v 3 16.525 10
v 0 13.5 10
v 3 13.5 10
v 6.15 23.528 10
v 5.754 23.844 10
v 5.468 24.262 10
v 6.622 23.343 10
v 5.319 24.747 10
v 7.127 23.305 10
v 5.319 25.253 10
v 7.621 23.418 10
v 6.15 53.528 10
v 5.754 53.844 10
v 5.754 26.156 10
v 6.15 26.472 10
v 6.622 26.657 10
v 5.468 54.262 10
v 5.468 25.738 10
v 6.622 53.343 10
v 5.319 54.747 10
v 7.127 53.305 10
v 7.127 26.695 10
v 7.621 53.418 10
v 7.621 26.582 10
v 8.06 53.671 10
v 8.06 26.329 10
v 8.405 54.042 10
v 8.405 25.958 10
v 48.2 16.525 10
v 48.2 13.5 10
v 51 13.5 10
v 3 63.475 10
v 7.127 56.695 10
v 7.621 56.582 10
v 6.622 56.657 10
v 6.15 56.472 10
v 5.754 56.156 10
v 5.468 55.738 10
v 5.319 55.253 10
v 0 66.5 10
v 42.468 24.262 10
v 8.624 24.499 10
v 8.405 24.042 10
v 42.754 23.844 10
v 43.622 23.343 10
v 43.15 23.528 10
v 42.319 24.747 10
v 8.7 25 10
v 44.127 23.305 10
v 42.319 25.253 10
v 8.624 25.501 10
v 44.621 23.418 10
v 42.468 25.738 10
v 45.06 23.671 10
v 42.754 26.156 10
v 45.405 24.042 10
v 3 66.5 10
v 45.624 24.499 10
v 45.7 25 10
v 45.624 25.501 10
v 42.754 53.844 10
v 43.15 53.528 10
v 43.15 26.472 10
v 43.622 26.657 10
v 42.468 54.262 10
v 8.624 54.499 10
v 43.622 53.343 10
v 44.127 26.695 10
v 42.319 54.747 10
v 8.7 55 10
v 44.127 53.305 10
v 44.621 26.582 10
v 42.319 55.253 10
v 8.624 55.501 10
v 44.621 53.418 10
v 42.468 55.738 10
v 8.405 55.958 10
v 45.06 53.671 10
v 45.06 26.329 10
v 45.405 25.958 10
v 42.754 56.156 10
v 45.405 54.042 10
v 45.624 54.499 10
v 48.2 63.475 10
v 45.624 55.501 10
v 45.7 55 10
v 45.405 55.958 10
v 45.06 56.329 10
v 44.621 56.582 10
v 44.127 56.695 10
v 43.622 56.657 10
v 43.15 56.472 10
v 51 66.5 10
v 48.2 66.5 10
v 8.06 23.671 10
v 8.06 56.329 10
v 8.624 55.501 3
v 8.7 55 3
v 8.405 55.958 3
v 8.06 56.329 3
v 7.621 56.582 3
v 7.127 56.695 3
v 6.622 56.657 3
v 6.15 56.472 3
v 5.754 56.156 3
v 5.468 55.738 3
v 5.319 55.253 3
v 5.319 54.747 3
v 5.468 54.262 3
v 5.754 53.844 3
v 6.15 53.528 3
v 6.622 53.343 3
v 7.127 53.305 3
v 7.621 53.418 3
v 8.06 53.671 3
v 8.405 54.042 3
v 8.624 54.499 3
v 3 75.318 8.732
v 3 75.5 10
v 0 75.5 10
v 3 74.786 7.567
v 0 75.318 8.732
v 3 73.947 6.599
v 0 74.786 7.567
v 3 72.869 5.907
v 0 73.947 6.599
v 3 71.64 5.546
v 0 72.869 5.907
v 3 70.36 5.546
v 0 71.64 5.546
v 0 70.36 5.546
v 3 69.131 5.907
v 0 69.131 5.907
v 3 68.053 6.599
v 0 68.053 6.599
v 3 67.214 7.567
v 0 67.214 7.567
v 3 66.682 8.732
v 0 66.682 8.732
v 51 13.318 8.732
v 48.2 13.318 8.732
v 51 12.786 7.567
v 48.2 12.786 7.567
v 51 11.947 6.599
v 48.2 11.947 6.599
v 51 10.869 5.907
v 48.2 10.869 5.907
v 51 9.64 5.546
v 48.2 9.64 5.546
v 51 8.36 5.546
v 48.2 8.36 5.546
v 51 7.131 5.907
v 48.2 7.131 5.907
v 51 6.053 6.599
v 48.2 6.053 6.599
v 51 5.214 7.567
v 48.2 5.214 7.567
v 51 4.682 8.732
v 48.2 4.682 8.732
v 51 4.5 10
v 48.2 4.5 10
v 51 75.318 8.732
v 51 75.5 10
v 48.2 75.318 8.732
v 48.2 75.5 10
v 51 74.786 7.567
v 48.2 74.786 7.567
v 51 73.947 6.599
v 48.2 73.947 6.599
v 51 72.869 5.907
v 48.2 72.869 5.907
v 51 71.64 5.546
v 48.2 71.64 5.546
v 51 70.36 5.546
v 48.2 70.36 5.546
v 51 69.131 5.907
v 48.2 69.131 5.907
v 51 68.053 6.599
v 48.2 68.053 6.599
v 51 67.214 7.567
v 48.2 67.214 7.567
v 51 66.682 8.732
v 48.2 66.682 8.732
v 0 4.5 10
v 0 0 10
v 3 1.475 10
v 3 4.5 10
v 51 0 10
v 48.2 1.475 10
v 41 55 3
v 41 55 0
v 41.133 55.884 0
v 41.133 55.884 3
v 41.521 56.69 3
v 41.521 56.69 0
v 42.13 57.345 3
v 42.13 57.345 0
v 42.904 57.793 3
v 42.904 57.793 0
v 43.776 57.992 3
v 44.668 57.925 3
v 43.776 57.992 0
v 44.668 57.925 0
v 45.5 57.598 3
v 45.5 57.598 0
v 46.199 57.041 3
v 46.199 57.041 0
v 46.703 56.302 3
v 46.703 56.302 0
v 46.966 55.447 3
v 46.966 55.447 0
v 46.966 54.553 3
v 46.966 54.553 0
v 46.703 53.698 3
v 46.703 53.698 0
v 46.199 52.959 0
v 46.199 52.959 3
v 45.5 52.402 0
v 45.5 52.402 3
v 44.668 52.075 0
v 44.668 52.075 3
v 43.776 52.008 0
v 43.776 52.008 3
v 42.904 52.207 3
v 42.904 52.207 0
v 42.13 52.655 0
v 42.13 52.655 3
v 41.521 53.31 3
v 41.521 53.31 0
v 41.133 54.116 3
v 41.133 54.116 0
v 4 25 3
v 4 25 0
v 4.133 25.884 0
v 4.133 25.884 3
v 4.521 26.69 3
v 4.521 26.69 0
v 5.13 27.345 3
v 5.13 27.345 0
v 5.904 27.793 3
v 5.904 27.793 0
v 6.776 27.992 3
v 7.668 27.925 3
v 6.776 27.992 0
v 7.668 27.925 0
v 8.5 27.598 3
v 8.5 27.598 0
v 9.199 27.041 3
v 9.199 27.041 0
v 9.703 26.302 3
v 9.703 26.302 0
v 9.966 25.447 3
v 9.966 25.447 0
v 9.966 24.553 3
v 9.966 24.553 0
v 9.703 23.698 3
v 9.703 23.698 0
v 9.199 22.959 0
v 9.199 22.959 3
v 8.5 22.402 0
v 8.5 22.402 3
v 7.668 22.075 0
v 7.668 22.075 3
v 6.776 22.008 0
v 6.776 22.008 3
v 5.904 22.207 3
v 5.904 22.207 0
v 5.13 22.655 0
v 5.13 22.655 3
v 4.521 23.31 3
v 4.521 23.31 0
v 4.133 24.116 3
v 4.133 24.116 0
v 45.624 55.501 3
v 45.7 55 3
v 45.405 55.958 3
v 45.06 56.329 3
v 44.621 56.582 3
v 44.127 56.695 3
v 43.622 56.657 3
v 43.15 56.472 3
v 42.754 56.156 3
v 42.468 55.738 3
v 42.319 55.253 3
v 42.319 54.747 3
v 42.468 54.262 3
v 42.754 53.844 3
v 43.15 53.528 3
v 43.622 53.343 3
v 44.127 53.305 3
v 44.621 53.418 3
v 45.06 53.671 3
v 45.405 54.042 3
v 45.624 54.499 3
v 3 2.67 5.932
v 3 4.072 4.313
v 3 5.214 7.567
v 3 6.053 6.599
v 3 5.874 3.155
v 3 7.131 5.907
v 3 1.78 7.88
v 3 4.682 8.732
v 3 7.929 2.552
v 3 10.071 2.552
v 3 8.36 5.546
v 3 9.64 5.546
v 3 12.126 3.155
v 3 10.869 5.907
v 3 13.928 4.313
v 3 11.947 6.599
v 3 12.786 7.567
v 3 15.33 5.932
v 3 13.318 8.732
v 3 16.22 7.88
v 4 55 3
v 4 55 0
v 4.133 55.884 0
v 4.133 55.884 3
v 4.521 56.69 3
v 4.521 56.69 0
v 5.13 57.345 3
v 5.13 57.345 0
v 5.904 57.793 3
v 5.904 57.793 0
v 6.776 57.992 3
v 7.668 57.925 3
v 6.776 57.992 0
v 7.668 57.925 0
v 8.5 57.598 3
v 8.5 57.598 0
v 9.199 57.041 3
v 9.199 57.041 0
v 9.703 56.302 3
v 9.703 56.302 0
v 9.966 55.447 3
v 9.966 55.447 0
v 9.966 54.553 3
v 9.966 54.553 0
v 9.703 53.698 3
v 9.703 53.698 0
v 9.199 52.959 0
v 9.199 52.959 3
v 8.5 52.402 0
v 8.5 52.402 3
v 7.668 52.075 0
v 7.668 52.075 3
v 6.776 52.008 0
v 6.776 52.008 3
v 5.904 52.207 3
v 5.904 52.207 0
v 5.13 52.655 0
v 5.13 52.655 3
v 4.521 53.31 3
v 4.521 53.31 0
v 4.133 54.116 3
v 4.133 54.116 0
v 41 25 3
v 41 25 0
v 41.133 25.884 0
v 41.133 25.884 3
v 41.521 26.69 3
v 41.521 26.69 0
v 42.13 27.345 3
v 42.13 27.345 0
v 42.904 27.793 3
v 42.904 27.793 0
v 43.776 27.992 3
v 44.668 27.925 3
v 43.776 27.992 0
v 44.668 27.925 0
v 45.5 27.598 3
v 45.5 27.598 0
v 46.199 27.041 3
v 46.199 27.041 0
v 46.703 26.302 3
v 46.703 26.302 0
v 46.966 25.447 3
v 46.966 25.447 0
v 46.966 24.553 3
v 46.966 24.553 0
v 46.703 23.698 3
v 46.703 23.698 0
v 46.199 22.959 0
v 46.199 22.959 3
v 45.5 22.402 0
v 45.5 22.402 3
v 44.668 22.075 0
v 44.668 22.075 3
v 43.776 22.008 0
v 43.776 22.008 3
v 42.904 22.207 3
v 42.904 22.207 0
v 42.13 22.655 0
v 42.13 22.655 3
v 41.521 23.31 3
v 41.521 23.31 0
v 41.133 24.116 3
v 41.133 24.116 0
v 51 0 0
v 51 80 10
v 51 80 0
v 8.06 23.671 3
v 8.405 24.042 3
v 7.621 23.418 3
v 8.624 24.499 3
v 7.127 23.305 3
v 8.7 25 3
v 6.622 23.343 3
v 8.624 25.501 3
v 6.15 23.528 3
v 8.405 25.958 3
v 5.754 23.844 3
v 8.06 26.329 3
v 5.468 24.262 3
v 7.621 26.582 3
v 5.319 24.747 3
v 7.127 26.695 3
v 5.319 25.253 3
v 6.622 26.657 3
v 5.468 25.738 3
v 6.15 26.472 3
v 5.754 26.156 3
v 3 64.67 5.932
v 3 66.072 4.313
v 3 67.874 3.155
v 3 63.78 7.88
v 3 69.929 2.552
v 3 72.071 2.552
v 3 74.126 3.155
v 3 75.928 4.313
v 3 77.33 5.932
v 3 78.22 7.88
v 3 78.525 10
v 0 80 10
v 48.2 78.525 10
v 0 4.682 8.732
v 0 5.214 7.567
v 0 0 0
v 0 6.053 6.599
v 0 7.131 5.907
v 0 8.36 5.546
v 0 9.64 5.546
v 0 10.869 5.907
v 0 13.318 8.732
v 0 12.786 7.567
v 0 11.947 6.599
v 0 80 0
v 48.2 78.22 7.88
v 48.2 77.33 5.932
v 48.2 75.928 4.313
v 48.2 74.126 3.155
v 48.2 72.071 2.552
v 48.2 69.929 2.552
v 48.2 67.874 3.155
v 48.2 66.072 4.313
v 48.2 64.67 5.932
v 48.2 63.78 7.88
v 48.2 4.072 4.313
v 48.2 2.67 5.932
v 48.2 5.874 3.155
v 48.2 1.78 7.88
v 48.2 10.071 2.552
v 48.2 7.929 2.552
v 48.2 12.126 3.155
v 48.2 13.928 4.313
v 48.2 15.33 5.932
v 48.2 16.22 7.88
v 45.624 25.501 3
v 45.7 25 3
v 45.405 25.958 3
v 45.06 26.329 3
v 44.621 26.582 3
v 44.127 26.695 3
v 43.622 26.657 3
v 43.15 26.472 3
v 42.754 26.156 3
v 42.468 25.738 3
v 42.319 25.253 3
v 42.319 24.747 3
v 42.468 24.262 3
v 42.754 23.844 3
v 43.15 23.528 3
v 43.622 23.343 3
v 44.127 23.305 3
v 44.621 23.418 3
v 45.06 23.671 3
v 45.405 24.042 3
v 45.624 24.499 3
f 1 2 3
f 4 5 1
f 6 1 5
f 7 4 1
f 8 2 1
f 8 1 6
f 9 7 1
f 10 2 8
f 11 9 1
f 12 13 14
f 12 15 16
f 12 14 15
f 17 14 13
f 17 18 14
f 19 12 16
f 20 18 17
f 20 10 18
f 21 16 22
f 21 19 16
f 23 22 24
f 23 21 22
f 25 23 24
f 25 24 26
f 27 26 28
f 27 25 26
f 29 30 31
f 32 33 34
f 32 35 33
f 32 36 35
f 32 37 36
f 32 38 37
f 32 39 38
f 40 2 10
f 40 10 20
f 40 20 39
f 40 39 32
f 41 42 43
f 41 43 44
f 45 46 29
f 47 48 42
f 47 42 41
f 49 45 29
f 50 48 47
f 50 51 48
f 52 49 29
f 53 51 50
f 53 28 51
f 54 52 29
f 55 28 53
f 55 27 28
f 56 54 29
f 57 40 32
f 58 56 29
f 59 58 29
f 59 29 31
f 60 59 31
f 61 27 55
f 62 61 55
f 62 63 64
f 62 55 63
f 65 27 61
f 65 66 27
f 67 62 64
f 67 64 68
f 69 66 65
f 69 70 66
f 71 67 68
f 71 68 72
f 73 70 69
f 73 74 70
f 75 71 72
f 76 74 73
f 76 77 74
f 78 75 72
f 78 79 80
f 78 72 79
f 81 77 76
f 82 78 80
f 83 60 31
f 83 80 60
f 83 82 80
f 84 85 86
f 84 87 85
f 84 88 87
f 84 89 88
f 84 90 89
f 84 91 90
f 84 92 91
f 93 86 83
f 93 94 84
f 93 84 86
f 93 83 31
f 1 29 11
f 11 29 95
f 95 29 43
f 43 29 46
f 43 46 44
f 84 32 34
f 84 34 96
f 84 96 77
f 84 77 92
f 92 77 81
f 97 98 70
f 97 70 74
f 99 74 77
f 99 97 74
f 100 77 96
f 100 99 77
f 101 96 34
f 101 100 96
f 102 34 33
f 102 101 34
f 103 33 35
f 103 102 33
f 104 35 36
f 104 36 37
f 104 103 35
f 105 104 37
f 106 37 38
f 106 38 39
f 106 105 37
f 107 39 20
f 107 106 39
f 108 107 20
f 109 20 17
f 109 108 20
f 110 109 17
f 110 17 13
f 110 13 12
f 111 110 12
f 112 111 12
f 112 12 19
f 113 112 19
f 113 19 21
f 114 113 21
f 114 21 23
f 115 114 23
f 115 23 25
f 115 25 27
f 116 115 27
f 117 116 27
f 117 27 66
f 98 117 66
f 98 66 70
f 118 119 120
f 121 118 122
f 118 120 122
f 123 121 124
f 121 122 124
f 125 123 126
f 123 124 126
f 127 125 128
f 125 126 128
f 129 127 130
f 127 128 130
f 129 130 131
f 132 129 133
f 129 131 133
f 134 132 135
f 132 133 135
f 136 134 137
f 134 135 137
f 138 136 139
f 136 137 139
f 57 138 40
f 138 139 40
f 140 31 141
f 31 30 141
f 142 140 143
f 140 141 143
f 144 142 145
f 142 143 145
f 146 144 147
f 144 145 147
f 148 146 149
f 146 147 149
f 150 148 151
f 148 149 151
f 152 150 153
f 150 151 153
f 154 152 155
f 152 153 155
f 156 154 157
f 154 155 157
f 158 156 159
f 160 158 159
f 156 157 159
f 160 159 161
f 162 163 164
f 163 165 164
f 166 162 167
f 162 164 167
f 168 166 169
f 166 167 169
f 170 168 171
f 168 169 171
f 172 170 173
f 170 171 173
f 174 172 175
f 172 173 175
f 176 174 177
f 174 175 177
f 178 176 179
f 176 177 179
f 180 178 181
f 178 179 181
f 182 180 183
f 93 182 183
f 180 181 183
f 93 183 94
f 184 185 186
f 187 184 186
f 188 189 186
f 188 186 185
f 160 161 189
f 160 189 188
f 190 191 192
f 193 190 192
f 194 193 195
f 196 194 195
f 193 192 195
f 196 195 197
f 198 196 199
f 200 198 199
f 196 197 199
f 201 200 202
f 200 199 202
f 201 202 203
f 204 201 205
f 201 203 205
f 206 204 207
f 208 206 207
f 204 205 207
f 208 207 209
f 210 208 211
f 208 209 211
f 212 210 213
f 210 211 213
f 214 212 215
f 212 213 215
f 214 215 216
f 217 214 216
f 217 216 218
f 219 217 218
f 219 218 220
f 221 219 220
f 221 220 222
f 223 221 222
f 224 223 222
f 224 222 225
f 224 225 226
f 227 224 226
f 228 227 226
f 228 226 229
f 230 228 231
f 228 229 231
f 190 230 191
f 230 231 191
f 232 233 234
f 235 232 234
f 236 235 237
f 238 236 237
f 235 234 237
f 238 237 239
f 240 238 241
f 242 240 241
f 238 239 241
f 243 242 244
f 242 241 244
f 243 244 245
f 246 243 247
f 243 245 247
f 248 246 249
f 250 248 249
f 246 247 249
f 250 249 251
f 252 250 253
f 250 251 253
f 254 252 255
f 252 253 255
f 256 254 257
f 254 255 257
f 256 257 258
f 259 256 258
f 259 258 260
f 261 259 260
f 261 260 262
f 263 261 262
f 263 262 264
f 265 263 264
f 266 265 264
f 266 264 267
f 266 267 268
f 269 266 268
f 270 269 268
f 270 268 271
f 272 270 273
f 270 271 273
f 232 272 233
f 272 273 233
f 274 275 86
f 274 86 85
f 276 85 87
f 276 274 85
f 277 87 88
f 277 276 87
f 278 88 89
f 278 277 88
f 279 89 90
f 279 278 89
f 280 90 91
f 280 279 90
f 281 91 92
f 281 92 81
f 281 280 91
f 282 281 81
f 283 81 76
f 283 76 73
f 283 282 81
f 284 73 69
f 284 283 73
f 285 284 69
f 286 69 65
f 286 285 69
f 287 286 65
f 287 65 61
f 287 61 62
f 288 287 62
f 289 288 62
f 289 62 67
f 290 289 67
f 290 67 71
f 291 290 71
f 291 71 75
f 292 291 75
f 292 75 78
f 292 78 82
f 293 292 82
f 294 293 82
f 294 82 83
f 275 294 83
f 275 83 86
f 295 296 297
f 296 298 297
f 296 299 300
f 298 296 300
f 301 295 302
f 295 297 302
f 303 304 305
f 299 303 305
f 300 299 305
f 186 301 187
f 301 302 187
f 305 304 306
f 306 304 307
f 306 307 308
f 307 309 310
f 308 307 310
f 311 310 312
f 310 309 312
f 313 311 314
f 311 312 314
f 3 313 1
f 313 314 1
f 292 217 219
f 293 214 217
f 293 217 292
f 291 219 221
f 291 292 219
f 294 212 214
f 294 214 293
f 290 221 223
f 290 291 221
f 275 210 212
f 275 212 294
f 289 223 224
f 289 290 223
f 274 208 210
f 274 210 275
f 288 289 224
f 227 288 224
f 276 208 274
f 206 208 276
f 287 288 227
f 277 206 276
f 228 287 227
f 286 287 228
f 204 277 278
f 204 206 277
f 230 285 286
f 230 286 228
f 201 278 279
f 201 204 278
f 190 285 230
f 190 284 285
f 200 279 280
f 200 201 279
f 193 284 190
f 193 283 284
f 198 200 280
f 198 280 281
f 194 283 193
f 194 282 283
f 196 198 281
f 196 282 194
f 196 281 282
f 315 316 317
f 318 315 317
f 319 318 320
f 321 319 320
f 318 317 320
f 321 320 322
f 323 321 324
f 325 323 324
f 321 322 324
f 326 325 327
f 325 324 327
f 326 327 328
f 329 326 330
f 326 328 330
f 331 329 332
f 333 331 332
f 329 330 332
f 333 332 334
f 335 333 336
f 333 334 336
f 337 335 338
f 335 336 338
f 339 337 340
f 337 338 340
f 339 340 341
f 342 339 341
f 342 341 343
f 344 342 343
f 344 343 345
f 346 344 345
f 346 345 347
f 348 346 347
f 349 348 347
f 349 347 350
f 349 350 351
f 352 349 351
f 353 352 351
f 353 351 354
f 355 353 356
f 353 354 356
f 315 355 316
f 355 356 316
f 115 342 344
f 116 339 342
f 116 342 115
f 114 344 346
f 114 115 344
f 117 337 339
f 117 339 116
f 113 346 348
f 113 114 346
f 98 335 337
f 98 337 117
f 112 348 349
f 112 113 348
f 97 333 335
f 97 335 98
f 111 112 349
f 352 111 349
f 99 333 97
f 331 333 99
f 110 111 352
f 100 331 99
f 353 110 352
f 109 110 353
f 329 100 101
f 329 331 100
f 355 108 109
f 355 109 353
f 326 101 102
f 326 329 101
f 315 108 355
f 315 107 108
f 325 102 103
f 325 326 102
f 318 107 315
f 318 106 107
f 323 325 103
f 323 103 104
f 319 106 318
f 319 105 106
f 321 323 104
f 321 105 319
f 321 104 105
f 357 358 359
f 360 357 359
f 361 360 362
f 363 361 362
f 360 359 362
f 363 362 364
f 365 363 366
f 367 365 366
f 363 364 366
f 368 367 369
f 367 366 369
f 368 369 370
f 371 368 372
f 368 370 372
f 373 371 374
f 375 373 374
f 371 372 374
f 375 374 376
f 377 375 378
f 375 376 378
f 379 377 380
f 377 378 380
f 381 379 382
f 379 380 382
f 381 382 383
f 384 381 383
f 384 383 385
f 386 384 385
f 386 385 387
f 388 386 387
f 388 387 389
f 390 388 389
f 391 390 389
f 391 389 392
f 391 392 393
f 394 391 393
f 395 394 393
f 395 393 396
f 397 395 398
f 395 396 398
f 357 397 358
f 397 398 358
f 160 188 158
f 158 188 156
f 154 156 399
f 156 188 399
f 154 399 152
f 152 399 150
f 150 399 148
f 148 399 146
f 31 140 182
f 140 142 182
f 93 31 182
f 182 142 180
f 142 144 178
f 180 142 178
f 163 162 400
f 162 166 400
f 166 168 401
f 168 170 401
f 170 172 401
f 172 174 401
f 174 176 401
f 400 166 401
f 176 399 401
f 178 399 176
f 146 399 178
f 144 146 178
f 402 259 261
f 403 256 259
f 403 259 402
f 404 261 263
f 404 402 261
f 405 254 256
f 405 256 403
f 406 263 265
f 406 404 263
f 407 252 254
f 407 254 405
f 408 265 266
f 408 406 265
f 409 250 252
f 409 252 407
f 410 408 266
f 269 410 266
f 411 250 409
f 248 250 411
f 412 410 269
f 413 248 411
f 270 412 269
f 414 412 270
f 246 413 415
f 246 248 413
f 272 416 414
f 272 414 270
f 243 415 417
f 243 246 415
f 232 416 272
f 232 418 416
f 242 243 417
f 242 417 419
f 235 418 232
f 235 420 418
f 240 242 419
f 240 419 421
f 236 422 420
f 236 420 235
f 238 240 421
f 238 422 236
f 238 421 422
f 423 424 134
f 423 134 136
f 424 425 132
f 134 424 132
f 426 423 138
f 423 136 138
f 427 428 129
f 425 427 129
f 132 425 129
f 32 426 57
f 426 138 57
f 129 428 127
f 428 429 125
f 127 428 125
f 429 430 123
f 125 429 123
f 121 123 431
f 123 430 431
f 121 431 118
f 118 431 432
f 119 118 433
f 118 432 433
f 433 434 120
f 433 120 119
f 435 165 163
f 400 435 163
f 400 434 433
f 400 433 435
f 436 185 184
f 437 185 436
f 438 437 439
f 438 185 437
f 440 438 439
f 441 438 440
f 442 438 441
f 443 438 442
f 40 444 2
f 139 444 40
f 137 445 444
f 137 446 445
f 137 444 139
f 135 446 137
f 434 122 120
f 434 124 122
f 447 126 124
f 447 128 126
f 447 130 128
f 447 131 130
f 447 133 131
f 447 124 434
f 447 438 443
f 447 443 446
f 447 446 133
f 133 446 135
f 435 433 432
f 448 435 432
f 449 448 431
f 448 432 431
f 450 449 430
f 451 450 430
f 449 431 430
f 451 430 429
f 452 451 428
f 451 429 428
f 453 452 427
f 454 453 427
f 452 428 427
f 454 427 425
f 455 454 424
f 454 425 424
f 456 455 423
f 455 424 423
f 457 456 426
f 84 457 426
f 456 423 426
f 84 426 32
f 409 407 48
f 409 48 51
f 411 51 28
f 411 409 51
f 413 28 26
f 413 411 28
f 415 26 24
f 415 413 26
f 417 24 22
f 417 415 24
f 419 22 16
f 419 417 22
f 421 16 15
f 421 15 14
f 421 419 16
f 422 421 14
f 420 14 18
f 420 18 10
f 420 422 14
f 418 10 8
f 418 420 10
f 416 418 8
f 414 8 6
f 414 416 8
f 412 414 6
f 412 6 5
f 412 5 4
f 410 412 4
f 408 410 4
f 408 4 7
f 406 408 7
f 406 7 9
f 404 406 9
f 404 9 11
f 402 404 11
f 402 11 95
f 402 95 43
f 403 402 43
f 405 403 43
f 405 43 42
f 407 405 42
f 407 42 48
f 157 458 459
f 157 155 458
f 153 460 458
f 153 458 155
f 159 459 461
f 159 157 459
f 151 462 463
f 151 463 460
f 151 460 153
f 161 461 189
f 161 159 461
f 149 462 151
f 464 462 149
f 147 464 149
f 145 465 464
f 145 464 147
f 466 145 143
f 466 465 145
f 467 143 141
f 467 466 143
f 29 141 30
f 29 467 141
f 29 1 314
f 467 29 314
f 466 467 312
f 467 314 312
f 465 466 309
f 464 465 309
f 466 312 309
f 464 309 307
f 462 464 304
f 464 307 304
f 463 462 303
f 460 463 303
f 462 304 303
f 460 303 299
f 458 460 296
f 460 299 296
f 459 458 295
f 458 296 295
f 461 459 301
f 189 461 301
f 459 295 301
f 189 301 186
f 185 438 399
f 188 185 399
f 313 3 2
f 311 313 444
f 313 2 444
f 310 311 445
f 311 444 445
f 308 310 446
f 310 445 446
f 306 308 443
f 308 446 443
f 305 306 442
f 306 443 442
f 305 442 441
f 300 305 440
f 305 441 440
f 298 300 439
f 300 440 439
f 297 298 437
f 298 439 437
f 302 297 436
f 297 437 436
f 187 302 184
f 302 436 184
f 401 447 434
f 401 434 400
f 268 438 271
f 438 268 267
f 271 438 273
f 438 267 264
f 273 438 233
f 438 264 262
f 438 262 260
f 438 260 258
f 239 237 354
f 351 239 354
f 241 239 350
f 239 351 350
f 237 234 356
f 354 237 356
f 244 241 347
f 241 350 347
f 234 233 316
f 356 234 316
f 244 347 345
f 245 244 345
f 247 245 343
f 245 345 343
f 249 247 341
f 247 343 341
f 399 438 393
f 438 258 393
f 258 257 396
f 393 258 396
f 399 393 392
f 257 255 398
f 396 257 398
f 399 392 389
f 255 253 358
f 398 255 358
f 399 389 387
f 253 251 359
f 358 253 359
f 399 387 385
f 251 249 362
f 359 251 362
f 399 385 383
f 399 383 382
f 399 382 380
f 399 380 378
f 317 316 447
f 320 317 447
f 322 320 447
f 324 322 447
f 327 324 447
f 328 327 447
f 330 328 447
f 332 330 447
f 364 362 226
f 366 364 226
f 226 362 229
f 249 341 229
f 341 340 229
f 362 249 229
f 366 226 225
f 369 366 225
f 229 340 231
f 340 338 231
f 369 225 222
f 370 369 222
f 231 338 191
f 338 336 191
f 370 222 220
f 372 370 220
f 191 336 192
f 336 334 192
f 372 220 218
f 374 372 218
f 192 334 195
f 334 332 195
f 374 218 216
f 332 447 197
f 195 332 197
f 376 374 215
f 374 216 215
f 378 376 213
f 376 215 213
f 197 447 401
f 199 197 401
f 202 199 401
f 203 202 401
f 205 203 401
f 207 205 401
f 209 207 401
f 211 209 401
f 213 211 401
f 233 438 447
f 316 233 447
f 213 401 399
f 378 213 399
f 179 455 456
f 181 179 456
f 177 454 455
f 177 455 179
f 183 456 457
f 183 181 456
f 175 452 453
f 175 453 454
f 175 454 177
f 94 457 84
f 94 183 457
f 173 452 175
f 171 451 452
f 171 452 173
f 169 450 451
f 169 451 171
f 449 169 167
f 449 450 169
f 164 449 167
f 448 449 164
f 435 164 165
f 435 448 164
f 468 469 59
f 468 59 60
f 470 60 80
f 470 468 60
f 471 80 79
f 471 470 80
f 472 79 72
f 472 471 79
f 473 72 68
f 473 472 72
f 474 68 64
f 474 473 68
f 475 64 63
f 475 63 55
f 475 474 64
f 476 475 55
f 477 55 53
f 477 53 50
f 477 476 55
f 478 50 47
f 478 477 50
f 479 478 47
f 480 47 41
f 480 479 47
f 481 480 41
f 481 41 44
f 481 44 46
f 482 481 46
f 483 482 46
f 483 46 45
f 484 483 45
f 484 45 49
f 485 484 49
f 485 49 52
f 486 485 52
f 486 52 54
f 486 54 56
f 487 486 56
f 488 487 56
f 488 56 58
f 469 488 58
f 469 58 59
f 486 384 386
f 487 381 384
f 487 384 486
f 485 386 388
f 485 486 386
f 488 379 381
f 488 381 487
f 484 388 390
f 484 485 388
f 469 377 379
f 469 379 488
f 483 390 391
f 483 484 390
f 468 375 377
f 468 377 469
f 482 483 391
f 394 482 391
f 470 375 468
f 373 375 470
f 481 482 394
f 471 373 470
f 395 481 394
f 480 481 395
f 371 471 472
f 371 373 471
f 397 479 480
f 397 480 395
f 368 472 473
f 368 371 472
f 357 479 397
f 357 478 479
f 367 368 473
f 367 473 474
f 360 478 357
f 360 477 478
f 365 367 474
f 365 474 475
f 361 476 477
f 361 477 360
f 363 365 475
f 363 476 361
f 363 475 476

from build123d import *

# Parameters (mm, degrees)
SKETCH1_W           = 51
SKETCH1_H           = 80
SKETCH1_R           = 1.7
BOSS_EXTRUDE1_DEPTH = 10
SKETCH2_R           = 7.525
CUT_EXTRUDE1_DEPTH  = 45.2
SKETCH3_R           = 4.5
CUT_EXTRUDE2_DEPTH  = 96.399161422
SKETCH4_R           = 3
CUT_EXTRUDE3_DEPTH  = 3


with BuildPart() as part:
    # Sketch1 → Boss-Extrude1 (new body)
    with BuildSketch(Plane.XY):
        with Locations((25.5, 40)):
            Rectangle(SKETCH1_W, SKETCH1_H)
        with Locations((7, 55)):
            Circle(SKETCH1_R, mode=Mode.SUBTRACT)
        with Locations((44, 55)):
            Circle(SKETCH1_R, mode=Mode.SUBTRACT)
        with Locations((7, 25)):
            Circle(SKETCH1_R, mode=Mode.SUBTRACT)
        with Locations((44, 25)):
            Circle(SKETCH1_R, mode=Mode.SUBTRACT)
    extrude(amount=BOSS_EXTRUDE1_DEPTH)

    # Sketch2 → Cut-Extrude1 (cut)
    with BuildSketch(Plane.ZY.offset(-3)):
        with Locations((10, 71)):
            Circle(SKETCH2_R)
        with Locations((10, 9)):
            Circle(SKETCH2_R)
    extrude(amount=-CUT_EXTRUDE1_DEPTH, mode=Mode.SUBTRACT)

    # Sketch3 → Cut-Extrude2 (cut, through all)
    with BuildSketch(Plane.ZY):
        with Locations((10, 71)):
            Circle(SKETCH3_R)
        with Locations((10, 9)):
            Circle(SKETCH3_R)
    extrude(amount=-CUT_EXTRUDE2_DEPTH, mode=Mode.SUBTRACT)

    # Sketch4 → Cut-Extrude3 (cut)
    with BuildSketch(Plane(origin=(0, 0, 0), x_dir=(-1, 0, 0), z_dir=(0, 0, -1))):
        with Locations((-44, 55)):
            Circle(SKETCH4_R)
        with Locations((-7, 55)):
            Circle(SKETCH4_R)
        with Locations((-7, 25)):
            Circle(SKETCH4_R)
        with Locations((-44, 25)):
            Circle(SKETCH4_R)
    extrude(amount=-CUT_EXTRUDE3_DEPTH, mode=Mode.SUBTRACT)


solid = part.part
